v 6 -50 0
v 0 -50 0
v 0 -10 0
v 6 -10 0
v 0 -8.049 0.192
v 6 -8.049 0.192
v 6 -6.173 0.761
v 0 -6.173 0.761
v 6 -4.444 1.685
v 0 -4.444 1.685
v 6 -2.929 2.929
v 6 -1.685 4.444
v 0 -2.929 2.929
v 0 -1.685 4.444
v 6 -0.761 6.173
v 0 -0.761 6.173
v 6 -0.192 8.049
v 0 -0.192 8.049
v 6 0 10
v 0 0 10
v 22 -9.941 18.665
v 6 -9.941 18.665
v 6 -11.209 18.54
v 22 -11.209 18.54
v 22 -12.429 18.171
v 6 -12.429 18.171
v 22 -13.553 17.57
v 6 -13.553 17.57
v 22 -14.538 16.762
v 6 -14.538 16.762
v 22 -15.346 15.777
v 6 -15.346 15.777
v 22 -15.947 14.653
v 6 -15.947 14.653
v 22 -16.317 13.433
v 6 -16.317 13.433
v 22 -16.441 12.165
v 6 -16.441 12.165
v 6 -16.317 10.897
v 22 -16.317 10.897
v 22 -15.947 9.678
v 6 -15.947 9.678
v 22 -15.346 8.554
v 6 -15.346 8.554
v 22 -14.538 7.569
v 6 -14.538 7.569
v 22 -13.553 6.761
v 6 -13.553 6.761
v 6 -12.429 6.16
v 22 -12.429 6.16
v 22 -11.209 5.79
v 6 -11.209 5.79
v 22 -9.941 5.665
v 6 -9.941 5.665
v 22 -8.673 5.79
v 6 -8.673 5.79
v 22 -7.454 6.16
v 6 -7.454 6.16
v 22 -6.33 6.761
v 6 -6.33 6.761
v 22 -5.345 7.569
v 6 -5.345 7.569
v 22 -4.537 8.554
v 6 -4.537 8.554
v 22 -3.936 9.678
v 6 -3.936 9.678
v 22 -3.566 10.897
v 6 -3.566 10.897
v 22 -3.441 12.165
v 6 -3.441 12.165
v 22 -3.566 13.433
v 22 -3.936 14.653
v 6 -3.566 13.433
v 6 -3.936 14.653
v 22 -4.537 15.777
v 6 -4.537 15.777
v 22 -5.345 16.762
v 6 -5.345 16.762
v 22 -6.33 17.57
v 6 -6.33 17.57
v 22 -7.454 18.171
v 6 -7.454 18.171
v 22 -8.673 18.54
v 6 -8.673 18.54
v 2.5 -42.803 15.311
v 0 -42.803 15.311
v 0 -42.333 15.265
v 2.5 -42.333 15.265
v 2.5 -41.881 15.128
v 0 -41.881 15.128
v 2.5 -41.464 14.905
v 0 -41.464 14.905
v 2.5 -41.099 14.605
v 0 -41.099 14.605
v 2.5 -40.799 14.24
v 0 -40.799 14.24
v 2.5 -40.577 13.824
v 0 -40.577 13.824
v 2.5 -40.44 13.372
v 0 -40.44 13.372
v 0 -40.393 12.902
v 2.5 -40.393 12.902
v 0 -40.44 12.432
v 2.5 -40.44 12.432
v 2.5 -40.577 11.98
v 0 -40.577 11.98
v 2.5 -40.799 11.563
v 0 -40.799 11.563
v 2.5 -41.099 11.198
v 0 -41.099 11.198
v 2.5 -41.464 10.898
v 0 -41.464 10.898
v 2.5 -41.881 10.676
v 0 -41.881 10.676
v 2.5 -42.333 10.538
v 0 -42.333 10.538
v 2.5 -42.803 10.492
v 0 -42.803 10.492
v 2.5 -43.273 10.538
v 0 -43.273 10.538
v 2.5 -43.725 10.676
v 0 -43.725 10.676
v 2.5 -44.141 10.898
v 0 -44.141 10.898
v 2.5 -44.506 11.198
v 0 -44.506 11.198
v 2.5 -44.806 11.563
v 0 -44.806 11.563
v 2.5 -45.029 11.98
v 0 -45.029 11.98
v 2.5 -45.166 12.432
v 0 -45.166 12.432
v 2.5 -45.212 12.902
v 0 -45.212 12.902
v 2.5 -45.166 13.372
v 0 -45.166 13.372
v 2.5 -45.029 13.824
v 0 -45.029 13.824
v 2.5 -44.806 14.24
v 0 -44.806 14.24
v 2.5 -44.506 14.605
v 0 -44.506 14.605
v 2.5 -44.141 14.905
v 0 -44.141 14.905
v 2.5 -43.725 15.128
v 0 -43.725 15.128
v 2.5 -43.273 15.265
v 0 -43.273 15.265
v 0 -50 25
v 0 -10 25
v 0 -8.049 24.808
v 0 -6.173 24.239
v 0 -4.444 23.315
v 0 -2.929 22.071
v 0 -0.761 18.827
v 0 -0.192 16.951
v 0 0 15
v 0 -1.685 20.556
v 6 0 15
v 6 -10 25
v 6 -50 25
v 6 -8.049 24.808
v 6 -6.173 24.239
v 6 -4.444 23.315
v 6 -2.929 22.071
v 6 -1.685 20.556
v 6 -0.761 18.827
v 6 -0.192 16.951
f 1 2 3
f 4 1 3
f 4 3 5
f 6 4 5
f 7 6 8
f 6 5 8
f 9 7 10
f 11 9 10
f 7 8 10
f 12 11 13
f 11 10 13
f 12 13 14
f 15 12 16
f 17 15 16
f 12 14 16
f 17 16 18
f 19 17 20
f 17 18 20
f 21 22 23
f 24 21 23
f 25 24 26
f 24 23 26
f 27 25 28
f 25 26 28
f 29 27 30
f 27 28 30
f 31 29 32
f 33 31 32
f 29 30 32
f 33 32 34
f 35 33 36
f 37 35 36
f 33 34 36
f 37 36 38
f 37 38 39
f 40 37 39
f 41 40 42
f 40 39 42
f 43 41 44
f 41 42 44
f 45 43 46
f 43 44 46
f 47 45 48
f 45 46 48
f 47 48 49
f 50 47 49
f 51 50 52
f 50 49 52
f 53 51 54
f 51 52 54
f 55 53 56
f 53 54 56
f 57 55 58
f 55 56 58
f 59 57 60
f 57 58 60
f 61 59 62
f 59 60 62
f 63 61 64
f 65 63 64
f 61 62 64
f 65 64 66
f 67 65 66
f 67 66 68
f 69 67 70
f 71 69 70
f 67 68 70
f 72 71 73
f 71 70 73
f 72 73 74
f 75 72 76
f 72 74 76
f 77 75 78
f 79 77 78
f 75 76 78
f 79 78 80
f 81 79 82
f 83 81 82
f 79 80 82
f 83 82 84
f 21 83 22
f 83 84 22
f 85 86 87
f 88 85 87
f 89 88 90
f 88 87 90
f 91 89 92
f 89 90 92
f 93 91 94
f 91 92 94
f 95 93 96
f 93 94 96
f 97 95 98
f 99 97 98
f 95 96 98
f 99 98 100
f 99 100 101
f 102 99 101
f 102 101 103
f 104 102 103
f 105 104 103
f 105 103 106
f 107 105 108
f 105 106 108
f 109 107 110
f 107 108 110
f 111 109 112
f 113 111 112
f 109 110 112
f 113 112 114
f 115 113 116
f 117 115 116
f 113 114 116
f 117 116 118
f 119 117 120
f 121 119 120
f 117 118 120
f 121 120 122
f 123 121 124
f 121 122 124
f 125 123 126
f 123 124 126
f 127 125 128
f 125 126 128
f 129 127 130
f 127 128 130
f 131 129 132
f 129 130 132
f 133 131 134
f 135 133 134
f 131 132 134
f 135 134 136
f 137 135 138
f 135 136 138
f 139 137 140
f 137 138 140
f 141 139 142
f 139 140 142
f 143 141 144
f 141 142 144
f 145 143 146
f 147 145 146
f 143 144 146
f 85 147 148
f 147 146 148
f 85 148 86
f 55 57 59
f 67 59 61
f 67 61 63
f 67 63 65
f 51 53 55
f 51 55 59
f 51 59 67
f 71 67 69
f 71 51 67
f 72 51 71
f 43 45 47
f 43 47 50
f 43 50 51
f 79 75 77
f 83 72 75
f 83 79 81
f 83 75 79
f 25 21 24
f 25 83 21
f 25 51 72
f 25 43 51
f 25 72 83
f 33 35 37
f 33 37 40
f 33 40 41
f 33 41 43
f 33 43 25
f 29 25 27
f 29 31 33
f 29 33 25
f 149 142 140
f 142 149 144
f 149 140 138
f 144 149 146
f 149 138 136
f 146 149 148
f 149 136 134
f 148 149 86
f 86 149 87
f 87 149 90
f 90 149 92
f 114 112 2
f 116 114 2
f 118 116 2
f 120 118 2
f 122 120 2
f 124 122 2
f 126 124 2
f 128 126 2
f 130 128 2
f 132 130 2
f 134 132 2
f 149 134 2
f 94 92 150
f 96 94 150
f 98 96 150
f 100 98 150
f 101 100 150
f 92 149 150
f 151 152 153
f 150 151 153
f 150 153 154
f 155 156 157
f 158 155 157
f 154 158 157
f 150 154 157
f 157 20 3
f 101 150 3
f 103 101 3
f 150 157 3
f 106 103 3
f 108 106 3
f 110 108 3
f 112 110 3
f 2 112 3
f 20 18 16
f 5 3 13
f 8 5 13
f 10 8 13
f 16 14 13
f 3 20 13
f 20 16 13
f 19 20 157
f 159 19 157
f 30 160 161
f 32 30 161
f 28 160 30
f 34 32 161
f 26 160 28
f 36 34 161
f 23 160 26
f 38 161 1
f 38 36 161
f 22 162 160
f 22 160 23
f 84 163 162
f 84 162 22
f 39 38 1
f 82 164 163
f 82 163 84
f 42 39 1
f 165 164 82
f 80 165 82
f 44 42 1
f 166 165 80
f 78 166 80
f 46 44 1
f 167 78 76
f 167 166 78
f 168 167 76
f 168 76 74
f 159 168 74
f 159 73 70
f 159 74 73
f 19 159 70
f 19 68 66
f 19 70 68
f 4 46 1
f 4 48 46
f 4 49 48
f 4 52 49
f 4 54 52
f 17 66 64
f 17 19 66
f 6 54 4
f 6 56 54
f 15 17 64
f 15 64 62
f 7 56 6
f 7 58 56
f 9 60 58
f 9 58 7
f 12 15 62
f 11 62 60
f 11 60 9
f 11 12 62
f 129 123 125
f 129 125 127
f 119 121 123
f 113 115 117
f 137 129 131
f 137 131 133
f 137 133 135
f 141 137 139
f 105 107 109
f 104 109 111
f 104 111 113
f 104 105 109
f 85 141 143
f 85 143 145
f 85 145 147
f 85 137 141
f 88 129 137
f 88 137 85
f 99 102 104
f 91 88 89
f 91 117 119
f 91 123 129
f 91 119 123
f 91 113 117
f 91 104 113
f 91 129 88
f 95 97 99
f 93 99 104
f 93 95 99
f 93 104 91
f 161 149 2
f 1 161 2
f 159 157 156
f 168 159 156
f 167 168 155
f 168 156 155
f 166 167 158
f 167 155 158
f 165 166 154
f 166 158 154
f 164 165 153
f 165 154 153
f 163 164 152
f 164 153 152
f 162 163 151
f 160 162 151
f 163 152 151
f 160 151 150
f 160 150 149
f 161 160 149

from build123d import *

# Parameters (mm, degrees)
BOSS_EXTRUDE1_DEPTH = 6
SKETCH2_R           = 6.5
BOSS_EXTRUDE2_DEPTH = 16
SKETCH3_R           = 2.409375482
CUT_EXTRUDE1_DEPTH  = 2.5


with BuildPart() as part:
    # Sketch1 → Boss-Extrude1 (new body)
    with BuildSketch(Plane(origin=(0, 0, 0), x_dir=(0, 0, -1), z_dir=(1, 0, 0))):
        with BuildLine():
            Line((-10, 0), (-15, 0))
            ThreePointArc((-15, 0), (-22.071067812, -2.928932188), (-25, -10))
            Line((-25, -10), (-25, -50))
            Line((-25, -50), (0, -50))
            Line((0, -50), (0, -10))
            ThreePointArc((0, -10), (-2.928932188, -2.928932188), (-10, 0))
        make_face()
    extrude(amount=BOSS_EXTRUDE1_DEPTH)

    # Sketch2 → Boss-Extrude2 (add)
    with BuildSketch(Plane(origin=(6, 0, 0), x_dir=(0, 0, -1), z_dir=(1, 0, 0))):
        with Locations(Location((-12.165364516, -9.941403235, 0), (0, 0, 180))):
            Circle(SKETCH2_R)
    extrude(amount=BOSS_EXTRUDE2_DEPTH)

    # Sketch3 → Cut-Extrude1 (cut)
    with BuildSketch(Plane.ZY):
        with Locations((12.90156258, -42.802607731)):
            Circle(SKETCH3_R)
    extrude(amount=-CUT_EXTRUDE1_DEPTH, mode=Mode.SUBTRACT)


solid = part.part
